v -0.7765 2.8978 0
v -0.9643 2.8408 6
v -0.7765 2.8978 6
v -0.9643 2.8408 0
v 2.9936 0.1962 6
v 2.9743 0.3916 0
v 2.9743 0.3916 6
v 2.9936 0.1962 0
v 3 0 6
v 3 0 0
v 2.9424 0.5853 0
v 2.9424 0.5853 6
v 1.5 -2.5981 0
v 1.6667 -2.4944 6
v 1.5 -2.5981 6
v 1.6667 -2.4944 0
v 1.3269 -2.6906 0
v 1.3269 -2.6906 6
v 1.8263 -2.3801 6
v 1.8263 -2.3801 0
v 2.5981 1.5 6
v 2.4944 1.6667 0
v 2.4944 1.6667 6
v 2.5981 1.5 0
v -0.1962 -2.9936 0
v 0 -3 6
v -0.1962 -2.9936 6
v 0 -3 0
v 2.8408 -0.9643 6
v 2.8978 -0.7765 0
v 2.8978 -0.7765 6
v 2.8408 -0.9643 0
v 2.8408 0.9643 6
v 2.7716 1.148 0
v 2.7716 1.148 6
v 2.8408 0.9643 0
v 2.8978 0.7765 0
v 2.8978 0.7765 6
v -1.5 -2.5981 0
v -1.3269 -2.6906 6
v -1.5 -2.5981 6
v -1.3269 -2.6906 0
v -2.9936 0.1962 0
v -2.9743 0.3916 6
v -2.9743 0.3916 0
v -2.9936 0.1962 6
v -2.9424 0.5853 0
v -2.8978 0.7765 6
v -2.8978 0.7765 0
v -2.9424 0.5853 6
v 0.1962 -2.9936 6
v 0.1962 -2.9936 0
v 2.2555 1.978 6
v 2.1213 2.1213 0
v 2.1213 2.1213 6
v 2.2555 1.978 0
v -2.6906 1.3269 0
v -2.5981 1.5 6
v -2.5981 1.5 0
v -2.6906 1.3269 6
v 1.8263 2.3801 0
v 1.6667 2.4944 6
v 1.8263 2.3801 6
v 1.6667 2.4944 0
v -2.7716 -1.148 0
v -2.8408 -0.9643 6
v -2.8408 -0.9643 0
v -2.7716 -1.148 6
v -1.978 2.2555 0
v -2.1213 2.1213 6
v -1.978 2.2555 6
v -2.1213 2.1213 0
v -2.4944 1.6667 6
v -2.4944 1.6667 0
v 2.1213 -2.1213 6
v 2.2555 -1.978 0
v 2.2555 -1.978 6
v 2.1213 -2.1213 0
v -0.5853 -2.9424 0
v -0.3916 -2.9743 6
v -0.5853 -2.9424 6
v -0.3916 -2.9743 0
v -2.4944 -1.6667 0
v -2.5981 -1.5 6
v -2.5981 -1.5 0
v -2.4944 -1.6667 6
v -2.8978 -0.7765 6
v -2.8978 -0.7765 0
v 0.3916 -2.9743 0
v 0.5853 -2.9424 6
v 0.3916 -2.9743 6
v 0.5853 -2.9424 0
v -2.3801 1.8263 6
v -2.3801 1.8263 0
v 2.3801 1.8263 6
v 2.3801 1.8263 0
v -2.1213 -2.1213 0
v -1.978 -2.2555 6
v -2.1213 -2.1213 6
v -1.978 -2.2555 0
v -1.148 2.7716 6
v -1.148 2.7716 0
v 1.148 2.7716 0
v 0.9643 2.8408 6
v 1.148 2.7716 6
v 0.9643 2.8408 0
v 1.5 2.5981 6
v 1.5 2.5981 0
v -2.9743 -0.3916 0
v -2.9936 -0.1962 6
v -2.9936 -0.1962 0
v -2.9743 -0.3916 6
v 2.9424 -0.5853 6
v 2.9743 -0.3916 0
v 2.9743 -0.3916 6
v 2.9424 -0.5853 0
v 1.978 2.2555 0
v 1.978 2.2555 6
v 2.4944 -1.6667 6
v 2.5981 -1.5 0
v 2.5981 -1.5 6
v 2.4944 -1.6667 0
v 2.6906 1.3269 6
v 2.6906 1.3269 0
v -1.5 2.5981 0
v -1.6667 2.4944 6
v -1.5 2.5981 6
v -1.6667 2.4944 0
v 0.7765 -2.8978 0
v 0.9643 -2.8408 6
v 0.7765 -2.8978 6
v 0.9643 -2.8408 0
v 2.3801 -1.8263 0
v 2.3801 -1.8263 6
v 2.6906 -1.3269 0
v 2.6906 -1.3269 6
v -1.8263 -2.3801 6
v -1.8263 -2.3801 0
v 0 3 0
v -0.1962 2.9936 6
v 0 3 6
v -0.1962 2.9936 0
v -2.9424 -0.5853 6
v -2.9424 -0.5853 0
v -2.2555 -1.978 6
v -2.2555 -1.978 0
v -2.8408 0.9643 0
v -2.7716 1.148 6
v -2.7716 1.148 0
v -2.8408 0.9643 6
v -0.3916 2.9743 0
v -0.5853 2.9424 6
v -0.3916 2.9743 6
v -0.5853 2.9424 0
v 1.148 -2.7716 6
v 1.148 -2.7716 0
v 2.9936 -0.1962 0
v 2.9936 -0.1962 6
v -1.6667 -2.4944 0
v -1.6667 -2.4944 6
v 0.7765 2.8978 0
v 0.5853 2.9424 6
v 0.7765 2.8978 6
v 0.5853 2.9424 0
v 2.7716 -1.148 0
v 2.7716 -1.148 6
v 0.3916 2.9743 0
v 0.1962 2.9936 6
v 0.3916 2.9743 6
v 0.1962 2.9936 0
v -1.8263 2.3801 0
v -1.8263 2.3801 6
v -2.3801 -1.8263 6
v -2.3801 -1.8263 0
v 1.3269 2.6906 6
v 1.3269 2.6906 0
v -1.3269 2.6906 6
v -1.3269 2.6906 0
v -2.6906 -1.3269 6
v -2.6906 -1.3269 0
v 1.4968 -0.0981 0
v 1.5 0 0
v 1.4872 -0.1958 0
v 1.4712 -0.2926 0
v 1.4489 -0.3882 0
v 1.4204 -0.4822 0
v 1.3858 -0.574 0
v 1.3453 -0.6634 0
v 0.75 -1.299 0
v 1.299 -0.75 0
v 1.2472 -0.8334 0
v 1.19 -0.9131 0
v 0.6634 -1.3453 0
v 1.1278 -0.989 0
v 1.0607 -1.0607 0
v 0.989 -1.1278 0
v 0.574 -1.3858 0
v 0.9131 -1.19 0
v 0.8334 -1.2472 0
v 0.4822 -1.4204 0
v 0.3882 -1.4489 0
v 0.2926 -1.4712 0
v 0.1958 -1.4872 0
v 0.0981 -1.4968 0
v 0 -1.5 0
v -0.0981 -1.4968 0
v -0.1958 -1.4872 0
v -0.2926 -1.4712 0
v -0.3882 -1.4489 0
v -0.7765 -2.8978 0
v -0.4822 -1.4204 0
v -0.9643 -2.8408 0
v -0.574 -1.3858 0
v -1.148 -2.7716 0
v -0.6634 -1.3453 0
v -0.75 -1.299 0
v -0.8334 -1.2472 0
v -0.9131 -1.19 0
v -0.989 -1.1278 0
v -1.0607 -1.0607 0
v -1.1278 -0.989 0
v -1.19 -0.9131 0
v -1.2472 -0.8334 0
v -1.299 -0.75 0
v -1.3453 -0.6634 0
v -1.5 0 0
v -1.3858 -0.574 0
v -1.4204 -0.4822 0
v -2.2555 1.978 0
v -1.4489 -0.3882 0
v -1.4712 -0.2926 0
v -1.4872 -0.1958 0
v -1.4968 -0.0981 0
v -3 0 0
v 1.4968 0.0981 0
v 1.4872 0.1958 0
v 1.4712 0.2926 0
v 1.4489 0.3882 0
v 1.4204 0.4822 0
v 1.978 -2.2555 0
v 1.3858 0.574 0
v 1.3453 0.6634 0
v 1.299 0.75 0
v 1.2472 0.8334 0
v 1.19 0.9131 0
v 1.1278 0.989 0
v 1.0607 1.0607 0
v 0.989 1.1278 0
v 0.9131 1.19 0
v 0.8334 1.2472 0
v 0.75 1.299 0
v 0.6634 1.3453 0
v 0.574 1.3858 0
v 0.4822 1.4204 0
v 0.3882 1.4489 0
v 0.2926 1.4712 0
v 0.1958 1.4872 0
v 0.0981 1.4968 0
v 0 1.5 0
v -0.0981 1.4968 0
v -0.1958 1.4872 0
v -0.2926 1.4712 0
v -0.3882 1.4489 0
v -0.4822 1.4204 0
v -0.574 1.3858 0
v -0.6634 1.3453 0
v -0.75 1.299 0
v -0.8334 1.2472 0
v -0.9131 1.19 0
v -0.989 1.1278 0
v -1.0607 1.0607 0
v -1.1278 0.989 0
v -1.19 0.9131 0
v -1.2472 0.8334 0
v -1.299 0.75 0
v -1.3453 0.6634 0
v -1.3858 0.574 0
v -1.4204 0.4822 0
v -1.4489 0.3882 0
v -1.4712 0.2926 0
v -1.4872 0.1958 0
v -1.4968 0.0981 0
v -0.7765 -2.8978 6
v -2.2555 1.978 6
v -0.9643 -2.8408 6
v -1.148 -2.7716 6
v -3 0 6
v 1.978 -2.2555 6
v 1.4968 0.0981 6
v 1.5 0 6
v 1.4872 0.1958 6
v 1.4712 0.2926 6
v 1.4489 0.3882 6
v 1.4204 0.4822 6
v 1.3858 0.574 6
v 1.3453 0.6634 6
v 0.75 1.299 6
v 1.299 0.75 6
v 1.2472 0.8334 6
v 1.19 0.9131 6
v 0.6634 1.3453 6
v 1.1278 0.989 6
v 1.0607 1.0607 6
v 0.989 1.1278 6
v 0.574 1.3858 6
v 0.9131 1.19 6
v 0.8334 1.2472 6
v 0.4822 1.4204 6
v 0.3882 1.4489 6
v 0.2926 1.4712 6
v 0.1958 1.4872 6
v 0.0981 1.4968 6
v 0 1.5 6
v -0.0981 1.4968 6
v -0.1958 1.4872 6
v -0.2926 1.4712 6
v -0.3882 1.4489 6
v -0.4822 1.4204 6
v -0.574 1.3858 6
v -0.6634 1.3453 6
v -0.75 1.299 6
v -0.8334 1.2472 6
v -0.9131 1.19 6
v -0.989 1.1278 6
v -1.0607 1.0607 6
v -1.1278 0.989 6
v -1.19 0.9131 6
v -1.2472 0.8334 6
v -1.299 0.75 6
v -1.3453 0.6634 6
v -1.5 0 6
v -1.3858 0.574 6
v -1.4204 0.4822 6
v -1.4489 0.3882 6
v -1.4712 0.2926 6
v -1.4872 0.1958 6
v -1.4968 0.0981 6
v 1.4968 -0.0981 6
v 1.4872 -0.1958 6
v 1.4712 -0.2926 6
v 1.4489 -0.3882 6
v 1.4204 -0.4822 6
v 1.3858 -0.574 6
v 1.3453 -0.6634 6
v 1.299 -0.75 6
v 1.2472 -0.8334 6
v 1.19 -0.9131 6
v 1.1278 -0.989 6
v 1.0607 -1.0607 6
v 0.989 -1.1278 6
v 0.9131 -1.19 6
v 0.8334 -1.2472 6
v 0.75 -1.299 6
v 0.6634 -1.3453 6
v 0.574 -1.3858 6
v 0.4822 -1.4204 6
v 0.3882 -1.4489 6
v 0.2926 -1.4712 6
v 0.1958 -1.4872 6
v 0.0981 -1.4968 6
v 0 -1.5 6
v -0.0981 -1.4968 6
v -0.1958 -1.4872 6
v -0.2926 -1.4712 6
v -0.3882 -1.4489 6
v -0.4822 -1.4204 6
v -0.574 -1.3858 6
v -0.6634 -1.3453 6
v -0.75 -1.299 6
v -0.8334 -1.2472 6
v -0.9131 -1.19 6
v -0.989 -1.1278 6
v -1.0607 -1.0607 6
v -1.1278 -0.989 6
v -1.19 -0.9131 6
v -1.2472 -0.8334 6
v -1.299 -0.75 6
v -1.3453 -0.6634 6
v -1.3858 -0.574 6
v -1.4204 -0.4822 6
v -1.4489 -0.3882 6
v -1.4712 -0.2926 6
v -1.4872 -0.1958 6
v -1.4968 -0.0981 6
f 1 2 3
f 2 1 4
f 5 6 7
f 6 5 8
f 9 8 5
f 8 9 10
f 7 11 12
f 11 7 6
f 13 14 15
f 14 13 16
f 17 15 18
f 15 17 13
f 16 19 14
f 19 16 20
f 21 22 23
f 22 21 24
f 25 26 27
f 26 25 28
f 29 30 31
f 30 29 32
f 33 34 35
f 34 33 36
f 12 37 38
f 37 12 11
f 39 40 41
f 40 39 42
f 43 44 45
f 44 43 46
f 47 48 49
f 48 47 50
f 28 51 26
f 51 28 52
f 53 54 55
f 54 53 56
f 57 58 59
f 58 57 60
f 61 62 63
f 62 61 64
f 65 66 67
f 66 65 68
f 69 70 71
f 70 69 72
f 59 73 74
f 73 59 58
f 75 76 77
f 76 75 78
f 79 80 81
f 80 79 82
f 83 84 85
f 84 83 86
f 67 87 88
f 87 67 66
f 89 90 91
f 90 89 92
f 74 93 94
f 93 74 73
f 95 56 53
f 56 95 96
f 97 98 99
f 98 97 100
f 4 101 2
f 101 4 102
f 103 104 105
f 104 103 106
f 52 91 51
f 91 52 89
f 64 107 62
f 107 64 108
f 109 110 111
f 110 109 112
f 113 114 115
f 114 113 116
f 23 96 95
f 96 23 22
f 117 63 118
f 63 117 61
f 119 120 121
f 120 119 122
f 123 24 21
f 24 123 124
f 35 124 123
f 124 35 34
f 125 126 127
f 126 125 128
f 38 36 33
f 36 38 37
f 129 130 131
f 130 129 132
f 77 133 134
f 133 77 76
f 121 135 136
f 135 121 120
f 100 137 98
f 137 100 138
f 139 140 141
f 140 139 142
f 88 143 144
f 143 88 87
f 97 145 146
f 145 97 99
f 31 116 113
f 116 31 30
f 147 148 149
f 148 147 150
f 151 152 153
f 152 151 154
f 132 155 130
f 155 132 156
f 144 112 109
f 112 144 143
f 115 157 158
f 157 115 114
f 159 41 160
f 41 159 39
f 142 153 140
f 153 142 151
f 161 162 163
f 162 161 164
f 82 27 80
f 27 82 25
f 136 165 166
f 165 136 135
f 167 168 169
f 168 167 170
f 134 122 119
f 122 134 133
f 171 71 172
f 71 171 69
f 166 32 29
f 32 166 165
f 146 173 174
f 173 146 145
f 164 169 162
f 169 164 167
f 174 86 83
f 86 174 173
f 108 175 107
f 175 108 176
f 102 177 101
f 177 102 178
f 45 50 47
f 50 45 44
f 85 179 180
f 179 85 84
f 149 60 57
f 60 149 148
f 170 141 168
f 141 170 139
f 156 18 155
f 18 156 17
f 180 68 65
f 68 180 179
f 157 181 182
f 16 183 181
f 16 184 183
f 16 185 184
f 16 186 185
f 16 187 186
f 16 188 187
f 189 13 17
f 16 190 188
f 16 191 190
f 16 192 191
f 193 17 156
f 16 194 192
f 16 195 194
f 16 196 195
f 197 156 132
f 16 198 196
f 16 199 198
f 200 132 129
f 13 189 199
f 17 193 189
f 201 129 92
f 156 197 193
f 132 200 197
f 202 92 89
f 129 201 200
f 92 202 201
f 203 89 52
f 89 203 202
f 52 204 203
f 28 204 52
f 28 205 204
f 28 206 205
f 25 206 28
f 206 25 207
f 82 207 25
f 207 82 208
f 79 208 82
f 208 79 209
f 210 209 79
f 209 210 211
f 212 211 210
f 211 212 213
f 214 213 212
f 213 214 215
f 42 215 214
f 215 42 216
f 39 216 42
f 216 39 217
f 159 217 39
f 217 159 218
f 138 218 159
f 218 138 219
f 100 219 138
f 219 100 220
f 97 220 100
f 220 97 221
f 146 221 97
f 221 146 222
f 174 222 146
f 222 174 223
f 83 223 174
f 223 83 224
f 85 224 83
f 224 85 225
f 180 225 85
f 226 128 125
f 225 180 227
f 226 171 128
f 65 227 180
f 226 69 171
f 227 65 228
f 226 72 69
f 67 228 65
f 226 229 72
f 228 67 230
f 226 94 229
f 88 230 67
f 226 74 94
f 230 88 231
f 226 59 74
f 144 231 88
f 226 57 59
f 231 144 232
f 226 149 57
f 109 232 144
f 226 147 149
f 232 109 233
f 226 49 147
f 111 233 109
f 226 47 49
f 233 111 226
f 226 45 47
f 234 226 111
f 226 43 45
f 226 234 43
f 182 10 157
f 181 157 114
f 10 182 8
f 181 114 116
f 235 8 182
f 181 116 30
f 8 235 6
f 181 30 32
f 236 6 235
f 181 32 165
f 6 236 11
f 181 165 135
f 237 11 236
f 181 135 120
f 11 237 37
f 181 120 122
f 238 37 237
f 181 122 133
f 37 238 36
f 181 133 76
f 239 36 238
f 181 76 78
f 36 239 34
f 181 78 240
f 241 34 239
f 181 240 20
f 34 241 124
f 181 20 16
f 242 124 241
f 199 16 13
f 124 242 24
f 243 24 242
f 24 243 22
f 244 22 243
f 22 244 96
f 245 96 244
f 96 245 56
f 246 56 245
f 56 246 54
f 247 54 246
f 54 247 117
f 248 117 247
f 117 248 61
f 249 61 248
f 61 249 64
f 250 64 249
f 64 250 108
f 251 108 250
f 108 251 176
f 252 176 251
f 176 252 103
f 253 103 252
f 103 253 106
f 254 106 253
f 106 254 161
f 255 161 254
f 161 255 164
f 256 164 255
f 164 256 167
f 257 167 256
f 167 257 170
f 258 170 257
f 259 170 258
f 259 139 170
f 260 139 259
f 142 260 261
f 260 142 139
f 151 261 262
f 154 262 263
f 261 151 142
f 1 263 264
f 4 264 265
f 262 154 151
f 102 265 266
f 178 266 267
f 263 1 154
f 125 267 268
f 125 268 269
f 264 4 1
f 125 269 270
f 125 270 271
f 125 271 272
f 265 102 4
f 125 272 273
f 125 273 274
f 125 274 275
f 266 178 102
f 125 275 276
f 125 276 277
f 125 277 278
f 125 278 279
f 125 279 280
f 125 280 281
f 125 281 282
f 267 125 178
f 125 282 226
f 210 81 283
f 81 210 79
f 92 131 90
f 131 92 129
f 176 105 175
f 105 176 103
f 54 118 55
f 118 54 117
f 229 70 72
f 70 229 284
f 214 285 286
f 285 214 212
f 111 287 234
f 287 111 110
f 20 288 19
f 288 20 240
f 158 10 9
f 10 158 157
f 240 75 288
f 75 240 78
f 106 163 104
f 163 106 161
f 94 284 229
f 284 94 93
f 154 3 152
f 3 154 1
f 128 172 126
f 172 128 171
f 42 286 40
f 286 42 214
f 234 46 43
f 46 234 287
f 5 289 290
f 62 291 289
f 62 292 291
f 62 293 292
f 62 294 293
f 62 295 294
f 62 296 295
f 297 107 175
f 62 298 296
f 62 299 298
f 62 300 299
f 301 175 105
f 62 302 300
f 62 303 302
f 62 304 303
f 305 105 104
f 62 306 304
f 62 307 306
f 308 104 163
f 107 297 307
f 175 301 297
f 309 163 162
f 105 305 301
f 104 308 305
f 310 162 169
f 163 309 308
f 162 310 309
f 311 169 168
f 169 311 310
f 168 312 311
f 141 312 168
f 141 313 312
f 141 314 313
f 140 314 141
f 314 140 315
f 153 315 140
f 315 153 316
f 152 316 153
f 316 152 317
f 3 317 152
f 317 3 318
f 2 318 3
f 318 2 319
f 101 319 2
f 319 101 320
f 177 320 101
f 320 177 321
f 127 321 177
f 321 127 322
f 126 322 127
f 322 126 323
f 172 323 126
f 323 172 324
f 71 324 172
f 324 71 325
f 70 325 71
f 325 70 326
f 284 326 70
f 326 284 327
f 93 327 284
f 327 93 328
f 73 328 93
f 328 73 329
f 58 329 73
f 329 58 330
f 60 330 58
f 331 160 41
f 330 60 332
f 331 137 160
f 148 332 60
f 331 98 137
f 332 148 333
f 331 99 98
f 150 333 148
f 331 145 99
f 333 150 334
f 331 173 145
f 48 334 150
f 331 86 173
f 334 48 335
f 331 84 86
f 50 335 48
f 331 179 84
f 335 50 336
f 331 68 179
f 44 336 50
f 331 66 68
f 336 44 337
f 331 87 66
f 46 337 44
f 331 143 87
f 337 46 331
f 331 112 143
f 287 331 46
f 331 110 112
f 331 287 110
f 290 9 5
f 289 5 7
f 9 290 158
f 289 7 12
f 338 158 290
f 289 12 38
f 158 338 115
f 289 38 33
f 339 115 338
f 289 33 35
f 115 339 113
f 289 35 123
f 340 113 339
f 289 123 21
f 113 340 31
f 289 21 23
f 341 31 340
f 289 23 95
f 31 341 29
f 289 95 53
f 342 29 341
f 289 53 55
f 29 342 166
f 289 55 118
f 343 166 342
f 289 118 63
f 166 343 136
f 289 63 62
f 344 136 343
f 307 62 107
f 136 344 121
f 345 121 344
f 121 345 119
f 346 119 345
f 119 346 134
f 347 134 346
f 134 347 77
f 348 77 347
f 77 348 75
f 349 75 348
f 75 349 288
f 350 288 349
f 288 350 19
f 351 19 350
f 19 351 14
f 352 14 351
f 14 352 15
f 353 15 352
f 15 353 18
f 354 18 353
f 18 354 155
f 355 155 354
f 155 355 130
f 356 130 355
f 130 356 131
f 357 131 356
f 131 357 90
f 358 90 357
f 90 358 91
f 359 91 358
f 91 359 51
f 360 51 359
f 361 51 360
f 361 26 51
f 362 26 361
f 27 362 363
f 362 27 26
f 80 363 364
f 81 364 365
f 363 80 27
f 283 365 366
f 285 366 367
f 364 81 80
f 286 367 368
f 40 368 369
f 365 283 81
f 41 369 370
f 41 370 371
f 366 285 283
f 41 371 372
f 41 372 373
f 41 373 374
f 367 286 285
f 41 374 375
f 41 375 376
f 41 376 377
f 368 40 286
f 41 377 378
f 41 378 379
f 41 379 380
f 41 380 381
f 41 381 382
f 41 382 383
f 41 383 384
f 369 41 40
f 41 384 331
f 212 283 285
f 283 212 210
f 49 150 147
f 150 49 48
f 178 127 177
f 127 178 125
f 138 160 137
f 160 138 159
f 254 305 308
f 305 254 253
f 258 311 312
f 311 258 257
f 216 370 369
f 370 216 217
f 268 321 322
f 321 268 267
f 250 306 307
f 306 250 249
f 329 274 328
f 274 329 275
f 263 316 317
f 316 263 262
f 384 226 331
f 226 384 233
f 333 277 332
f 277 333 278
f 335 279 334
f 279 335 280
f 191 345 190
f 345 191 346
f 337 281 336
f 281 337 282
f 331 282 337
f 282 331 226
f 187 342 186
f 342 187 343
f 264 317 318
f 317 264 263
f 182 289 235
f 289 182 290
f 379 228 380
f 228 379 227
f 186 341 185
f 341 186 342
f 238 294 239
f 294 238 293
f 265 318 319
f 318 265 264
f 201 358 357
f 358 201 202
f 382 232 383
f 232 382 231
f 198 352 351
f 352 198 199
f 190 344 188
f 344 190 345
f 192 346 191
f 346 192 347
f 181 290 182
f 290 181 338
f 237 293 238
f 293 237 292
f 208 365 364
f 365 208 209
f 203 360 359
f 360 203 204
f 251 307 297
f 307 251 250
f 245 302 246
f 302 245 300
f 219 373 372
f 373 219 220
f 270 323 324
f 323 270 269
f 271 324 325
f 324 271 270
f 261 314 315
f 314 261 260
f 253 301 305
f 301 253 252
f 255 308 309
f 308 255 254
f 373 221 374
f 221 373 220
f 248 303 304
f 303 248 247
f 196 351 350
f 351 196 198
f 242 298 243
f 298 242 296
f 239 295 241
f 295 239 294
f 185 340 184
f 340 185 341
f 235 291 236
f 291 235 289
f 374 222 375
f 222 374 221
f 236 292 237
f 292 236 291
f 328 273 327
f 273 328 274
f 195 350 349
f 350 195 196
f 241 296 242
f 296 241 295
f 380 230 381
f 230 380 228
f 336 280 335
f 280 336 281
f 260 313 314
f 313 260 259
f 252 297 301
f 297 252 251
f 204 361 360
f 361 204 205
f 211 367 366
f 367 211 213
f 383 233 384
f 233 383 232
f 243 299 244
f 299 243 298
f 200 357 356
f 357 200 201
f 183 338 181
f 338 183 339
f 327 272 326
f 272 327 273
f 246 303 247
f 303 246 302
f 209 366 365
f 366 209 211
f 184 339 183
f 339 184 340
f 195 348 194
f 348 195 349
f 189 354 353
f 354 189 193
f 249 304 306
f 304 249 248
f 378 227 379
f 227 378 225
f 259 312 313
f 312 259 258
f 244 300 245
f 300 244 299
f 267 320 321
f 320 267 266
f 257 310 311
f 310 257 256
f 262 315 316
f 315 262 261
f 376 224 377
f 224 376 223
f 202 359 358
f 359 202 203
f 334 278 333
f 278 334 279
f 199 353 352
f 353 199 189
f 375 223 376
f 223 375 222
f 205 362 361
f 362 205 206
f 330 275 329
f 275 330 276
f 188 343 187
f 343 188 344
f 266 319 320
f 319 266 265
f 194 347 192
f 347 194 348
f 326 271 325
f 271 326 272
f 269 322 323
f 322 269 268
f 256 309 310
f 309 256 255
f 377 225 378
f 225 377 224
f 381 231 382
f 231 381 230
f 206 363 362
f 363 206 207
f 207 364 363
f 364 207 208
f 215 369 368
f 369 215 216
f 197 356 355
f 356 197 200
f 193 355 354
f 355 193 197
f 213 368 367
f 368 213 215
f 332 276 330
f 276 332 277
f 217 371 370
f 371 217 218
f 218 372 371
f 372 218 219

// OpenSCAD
$fn = 96;

thread_d = 3.0;      // mm (nominal)
length = 6.0;        // mm
outer_d = 6.0;       // mm (assumed since "Nonemm diameter" unclear)

difference() {
    cylinder(d = outer_d, h = length);
    cylinder(d = thread_d, h = length + 0.2);
}
